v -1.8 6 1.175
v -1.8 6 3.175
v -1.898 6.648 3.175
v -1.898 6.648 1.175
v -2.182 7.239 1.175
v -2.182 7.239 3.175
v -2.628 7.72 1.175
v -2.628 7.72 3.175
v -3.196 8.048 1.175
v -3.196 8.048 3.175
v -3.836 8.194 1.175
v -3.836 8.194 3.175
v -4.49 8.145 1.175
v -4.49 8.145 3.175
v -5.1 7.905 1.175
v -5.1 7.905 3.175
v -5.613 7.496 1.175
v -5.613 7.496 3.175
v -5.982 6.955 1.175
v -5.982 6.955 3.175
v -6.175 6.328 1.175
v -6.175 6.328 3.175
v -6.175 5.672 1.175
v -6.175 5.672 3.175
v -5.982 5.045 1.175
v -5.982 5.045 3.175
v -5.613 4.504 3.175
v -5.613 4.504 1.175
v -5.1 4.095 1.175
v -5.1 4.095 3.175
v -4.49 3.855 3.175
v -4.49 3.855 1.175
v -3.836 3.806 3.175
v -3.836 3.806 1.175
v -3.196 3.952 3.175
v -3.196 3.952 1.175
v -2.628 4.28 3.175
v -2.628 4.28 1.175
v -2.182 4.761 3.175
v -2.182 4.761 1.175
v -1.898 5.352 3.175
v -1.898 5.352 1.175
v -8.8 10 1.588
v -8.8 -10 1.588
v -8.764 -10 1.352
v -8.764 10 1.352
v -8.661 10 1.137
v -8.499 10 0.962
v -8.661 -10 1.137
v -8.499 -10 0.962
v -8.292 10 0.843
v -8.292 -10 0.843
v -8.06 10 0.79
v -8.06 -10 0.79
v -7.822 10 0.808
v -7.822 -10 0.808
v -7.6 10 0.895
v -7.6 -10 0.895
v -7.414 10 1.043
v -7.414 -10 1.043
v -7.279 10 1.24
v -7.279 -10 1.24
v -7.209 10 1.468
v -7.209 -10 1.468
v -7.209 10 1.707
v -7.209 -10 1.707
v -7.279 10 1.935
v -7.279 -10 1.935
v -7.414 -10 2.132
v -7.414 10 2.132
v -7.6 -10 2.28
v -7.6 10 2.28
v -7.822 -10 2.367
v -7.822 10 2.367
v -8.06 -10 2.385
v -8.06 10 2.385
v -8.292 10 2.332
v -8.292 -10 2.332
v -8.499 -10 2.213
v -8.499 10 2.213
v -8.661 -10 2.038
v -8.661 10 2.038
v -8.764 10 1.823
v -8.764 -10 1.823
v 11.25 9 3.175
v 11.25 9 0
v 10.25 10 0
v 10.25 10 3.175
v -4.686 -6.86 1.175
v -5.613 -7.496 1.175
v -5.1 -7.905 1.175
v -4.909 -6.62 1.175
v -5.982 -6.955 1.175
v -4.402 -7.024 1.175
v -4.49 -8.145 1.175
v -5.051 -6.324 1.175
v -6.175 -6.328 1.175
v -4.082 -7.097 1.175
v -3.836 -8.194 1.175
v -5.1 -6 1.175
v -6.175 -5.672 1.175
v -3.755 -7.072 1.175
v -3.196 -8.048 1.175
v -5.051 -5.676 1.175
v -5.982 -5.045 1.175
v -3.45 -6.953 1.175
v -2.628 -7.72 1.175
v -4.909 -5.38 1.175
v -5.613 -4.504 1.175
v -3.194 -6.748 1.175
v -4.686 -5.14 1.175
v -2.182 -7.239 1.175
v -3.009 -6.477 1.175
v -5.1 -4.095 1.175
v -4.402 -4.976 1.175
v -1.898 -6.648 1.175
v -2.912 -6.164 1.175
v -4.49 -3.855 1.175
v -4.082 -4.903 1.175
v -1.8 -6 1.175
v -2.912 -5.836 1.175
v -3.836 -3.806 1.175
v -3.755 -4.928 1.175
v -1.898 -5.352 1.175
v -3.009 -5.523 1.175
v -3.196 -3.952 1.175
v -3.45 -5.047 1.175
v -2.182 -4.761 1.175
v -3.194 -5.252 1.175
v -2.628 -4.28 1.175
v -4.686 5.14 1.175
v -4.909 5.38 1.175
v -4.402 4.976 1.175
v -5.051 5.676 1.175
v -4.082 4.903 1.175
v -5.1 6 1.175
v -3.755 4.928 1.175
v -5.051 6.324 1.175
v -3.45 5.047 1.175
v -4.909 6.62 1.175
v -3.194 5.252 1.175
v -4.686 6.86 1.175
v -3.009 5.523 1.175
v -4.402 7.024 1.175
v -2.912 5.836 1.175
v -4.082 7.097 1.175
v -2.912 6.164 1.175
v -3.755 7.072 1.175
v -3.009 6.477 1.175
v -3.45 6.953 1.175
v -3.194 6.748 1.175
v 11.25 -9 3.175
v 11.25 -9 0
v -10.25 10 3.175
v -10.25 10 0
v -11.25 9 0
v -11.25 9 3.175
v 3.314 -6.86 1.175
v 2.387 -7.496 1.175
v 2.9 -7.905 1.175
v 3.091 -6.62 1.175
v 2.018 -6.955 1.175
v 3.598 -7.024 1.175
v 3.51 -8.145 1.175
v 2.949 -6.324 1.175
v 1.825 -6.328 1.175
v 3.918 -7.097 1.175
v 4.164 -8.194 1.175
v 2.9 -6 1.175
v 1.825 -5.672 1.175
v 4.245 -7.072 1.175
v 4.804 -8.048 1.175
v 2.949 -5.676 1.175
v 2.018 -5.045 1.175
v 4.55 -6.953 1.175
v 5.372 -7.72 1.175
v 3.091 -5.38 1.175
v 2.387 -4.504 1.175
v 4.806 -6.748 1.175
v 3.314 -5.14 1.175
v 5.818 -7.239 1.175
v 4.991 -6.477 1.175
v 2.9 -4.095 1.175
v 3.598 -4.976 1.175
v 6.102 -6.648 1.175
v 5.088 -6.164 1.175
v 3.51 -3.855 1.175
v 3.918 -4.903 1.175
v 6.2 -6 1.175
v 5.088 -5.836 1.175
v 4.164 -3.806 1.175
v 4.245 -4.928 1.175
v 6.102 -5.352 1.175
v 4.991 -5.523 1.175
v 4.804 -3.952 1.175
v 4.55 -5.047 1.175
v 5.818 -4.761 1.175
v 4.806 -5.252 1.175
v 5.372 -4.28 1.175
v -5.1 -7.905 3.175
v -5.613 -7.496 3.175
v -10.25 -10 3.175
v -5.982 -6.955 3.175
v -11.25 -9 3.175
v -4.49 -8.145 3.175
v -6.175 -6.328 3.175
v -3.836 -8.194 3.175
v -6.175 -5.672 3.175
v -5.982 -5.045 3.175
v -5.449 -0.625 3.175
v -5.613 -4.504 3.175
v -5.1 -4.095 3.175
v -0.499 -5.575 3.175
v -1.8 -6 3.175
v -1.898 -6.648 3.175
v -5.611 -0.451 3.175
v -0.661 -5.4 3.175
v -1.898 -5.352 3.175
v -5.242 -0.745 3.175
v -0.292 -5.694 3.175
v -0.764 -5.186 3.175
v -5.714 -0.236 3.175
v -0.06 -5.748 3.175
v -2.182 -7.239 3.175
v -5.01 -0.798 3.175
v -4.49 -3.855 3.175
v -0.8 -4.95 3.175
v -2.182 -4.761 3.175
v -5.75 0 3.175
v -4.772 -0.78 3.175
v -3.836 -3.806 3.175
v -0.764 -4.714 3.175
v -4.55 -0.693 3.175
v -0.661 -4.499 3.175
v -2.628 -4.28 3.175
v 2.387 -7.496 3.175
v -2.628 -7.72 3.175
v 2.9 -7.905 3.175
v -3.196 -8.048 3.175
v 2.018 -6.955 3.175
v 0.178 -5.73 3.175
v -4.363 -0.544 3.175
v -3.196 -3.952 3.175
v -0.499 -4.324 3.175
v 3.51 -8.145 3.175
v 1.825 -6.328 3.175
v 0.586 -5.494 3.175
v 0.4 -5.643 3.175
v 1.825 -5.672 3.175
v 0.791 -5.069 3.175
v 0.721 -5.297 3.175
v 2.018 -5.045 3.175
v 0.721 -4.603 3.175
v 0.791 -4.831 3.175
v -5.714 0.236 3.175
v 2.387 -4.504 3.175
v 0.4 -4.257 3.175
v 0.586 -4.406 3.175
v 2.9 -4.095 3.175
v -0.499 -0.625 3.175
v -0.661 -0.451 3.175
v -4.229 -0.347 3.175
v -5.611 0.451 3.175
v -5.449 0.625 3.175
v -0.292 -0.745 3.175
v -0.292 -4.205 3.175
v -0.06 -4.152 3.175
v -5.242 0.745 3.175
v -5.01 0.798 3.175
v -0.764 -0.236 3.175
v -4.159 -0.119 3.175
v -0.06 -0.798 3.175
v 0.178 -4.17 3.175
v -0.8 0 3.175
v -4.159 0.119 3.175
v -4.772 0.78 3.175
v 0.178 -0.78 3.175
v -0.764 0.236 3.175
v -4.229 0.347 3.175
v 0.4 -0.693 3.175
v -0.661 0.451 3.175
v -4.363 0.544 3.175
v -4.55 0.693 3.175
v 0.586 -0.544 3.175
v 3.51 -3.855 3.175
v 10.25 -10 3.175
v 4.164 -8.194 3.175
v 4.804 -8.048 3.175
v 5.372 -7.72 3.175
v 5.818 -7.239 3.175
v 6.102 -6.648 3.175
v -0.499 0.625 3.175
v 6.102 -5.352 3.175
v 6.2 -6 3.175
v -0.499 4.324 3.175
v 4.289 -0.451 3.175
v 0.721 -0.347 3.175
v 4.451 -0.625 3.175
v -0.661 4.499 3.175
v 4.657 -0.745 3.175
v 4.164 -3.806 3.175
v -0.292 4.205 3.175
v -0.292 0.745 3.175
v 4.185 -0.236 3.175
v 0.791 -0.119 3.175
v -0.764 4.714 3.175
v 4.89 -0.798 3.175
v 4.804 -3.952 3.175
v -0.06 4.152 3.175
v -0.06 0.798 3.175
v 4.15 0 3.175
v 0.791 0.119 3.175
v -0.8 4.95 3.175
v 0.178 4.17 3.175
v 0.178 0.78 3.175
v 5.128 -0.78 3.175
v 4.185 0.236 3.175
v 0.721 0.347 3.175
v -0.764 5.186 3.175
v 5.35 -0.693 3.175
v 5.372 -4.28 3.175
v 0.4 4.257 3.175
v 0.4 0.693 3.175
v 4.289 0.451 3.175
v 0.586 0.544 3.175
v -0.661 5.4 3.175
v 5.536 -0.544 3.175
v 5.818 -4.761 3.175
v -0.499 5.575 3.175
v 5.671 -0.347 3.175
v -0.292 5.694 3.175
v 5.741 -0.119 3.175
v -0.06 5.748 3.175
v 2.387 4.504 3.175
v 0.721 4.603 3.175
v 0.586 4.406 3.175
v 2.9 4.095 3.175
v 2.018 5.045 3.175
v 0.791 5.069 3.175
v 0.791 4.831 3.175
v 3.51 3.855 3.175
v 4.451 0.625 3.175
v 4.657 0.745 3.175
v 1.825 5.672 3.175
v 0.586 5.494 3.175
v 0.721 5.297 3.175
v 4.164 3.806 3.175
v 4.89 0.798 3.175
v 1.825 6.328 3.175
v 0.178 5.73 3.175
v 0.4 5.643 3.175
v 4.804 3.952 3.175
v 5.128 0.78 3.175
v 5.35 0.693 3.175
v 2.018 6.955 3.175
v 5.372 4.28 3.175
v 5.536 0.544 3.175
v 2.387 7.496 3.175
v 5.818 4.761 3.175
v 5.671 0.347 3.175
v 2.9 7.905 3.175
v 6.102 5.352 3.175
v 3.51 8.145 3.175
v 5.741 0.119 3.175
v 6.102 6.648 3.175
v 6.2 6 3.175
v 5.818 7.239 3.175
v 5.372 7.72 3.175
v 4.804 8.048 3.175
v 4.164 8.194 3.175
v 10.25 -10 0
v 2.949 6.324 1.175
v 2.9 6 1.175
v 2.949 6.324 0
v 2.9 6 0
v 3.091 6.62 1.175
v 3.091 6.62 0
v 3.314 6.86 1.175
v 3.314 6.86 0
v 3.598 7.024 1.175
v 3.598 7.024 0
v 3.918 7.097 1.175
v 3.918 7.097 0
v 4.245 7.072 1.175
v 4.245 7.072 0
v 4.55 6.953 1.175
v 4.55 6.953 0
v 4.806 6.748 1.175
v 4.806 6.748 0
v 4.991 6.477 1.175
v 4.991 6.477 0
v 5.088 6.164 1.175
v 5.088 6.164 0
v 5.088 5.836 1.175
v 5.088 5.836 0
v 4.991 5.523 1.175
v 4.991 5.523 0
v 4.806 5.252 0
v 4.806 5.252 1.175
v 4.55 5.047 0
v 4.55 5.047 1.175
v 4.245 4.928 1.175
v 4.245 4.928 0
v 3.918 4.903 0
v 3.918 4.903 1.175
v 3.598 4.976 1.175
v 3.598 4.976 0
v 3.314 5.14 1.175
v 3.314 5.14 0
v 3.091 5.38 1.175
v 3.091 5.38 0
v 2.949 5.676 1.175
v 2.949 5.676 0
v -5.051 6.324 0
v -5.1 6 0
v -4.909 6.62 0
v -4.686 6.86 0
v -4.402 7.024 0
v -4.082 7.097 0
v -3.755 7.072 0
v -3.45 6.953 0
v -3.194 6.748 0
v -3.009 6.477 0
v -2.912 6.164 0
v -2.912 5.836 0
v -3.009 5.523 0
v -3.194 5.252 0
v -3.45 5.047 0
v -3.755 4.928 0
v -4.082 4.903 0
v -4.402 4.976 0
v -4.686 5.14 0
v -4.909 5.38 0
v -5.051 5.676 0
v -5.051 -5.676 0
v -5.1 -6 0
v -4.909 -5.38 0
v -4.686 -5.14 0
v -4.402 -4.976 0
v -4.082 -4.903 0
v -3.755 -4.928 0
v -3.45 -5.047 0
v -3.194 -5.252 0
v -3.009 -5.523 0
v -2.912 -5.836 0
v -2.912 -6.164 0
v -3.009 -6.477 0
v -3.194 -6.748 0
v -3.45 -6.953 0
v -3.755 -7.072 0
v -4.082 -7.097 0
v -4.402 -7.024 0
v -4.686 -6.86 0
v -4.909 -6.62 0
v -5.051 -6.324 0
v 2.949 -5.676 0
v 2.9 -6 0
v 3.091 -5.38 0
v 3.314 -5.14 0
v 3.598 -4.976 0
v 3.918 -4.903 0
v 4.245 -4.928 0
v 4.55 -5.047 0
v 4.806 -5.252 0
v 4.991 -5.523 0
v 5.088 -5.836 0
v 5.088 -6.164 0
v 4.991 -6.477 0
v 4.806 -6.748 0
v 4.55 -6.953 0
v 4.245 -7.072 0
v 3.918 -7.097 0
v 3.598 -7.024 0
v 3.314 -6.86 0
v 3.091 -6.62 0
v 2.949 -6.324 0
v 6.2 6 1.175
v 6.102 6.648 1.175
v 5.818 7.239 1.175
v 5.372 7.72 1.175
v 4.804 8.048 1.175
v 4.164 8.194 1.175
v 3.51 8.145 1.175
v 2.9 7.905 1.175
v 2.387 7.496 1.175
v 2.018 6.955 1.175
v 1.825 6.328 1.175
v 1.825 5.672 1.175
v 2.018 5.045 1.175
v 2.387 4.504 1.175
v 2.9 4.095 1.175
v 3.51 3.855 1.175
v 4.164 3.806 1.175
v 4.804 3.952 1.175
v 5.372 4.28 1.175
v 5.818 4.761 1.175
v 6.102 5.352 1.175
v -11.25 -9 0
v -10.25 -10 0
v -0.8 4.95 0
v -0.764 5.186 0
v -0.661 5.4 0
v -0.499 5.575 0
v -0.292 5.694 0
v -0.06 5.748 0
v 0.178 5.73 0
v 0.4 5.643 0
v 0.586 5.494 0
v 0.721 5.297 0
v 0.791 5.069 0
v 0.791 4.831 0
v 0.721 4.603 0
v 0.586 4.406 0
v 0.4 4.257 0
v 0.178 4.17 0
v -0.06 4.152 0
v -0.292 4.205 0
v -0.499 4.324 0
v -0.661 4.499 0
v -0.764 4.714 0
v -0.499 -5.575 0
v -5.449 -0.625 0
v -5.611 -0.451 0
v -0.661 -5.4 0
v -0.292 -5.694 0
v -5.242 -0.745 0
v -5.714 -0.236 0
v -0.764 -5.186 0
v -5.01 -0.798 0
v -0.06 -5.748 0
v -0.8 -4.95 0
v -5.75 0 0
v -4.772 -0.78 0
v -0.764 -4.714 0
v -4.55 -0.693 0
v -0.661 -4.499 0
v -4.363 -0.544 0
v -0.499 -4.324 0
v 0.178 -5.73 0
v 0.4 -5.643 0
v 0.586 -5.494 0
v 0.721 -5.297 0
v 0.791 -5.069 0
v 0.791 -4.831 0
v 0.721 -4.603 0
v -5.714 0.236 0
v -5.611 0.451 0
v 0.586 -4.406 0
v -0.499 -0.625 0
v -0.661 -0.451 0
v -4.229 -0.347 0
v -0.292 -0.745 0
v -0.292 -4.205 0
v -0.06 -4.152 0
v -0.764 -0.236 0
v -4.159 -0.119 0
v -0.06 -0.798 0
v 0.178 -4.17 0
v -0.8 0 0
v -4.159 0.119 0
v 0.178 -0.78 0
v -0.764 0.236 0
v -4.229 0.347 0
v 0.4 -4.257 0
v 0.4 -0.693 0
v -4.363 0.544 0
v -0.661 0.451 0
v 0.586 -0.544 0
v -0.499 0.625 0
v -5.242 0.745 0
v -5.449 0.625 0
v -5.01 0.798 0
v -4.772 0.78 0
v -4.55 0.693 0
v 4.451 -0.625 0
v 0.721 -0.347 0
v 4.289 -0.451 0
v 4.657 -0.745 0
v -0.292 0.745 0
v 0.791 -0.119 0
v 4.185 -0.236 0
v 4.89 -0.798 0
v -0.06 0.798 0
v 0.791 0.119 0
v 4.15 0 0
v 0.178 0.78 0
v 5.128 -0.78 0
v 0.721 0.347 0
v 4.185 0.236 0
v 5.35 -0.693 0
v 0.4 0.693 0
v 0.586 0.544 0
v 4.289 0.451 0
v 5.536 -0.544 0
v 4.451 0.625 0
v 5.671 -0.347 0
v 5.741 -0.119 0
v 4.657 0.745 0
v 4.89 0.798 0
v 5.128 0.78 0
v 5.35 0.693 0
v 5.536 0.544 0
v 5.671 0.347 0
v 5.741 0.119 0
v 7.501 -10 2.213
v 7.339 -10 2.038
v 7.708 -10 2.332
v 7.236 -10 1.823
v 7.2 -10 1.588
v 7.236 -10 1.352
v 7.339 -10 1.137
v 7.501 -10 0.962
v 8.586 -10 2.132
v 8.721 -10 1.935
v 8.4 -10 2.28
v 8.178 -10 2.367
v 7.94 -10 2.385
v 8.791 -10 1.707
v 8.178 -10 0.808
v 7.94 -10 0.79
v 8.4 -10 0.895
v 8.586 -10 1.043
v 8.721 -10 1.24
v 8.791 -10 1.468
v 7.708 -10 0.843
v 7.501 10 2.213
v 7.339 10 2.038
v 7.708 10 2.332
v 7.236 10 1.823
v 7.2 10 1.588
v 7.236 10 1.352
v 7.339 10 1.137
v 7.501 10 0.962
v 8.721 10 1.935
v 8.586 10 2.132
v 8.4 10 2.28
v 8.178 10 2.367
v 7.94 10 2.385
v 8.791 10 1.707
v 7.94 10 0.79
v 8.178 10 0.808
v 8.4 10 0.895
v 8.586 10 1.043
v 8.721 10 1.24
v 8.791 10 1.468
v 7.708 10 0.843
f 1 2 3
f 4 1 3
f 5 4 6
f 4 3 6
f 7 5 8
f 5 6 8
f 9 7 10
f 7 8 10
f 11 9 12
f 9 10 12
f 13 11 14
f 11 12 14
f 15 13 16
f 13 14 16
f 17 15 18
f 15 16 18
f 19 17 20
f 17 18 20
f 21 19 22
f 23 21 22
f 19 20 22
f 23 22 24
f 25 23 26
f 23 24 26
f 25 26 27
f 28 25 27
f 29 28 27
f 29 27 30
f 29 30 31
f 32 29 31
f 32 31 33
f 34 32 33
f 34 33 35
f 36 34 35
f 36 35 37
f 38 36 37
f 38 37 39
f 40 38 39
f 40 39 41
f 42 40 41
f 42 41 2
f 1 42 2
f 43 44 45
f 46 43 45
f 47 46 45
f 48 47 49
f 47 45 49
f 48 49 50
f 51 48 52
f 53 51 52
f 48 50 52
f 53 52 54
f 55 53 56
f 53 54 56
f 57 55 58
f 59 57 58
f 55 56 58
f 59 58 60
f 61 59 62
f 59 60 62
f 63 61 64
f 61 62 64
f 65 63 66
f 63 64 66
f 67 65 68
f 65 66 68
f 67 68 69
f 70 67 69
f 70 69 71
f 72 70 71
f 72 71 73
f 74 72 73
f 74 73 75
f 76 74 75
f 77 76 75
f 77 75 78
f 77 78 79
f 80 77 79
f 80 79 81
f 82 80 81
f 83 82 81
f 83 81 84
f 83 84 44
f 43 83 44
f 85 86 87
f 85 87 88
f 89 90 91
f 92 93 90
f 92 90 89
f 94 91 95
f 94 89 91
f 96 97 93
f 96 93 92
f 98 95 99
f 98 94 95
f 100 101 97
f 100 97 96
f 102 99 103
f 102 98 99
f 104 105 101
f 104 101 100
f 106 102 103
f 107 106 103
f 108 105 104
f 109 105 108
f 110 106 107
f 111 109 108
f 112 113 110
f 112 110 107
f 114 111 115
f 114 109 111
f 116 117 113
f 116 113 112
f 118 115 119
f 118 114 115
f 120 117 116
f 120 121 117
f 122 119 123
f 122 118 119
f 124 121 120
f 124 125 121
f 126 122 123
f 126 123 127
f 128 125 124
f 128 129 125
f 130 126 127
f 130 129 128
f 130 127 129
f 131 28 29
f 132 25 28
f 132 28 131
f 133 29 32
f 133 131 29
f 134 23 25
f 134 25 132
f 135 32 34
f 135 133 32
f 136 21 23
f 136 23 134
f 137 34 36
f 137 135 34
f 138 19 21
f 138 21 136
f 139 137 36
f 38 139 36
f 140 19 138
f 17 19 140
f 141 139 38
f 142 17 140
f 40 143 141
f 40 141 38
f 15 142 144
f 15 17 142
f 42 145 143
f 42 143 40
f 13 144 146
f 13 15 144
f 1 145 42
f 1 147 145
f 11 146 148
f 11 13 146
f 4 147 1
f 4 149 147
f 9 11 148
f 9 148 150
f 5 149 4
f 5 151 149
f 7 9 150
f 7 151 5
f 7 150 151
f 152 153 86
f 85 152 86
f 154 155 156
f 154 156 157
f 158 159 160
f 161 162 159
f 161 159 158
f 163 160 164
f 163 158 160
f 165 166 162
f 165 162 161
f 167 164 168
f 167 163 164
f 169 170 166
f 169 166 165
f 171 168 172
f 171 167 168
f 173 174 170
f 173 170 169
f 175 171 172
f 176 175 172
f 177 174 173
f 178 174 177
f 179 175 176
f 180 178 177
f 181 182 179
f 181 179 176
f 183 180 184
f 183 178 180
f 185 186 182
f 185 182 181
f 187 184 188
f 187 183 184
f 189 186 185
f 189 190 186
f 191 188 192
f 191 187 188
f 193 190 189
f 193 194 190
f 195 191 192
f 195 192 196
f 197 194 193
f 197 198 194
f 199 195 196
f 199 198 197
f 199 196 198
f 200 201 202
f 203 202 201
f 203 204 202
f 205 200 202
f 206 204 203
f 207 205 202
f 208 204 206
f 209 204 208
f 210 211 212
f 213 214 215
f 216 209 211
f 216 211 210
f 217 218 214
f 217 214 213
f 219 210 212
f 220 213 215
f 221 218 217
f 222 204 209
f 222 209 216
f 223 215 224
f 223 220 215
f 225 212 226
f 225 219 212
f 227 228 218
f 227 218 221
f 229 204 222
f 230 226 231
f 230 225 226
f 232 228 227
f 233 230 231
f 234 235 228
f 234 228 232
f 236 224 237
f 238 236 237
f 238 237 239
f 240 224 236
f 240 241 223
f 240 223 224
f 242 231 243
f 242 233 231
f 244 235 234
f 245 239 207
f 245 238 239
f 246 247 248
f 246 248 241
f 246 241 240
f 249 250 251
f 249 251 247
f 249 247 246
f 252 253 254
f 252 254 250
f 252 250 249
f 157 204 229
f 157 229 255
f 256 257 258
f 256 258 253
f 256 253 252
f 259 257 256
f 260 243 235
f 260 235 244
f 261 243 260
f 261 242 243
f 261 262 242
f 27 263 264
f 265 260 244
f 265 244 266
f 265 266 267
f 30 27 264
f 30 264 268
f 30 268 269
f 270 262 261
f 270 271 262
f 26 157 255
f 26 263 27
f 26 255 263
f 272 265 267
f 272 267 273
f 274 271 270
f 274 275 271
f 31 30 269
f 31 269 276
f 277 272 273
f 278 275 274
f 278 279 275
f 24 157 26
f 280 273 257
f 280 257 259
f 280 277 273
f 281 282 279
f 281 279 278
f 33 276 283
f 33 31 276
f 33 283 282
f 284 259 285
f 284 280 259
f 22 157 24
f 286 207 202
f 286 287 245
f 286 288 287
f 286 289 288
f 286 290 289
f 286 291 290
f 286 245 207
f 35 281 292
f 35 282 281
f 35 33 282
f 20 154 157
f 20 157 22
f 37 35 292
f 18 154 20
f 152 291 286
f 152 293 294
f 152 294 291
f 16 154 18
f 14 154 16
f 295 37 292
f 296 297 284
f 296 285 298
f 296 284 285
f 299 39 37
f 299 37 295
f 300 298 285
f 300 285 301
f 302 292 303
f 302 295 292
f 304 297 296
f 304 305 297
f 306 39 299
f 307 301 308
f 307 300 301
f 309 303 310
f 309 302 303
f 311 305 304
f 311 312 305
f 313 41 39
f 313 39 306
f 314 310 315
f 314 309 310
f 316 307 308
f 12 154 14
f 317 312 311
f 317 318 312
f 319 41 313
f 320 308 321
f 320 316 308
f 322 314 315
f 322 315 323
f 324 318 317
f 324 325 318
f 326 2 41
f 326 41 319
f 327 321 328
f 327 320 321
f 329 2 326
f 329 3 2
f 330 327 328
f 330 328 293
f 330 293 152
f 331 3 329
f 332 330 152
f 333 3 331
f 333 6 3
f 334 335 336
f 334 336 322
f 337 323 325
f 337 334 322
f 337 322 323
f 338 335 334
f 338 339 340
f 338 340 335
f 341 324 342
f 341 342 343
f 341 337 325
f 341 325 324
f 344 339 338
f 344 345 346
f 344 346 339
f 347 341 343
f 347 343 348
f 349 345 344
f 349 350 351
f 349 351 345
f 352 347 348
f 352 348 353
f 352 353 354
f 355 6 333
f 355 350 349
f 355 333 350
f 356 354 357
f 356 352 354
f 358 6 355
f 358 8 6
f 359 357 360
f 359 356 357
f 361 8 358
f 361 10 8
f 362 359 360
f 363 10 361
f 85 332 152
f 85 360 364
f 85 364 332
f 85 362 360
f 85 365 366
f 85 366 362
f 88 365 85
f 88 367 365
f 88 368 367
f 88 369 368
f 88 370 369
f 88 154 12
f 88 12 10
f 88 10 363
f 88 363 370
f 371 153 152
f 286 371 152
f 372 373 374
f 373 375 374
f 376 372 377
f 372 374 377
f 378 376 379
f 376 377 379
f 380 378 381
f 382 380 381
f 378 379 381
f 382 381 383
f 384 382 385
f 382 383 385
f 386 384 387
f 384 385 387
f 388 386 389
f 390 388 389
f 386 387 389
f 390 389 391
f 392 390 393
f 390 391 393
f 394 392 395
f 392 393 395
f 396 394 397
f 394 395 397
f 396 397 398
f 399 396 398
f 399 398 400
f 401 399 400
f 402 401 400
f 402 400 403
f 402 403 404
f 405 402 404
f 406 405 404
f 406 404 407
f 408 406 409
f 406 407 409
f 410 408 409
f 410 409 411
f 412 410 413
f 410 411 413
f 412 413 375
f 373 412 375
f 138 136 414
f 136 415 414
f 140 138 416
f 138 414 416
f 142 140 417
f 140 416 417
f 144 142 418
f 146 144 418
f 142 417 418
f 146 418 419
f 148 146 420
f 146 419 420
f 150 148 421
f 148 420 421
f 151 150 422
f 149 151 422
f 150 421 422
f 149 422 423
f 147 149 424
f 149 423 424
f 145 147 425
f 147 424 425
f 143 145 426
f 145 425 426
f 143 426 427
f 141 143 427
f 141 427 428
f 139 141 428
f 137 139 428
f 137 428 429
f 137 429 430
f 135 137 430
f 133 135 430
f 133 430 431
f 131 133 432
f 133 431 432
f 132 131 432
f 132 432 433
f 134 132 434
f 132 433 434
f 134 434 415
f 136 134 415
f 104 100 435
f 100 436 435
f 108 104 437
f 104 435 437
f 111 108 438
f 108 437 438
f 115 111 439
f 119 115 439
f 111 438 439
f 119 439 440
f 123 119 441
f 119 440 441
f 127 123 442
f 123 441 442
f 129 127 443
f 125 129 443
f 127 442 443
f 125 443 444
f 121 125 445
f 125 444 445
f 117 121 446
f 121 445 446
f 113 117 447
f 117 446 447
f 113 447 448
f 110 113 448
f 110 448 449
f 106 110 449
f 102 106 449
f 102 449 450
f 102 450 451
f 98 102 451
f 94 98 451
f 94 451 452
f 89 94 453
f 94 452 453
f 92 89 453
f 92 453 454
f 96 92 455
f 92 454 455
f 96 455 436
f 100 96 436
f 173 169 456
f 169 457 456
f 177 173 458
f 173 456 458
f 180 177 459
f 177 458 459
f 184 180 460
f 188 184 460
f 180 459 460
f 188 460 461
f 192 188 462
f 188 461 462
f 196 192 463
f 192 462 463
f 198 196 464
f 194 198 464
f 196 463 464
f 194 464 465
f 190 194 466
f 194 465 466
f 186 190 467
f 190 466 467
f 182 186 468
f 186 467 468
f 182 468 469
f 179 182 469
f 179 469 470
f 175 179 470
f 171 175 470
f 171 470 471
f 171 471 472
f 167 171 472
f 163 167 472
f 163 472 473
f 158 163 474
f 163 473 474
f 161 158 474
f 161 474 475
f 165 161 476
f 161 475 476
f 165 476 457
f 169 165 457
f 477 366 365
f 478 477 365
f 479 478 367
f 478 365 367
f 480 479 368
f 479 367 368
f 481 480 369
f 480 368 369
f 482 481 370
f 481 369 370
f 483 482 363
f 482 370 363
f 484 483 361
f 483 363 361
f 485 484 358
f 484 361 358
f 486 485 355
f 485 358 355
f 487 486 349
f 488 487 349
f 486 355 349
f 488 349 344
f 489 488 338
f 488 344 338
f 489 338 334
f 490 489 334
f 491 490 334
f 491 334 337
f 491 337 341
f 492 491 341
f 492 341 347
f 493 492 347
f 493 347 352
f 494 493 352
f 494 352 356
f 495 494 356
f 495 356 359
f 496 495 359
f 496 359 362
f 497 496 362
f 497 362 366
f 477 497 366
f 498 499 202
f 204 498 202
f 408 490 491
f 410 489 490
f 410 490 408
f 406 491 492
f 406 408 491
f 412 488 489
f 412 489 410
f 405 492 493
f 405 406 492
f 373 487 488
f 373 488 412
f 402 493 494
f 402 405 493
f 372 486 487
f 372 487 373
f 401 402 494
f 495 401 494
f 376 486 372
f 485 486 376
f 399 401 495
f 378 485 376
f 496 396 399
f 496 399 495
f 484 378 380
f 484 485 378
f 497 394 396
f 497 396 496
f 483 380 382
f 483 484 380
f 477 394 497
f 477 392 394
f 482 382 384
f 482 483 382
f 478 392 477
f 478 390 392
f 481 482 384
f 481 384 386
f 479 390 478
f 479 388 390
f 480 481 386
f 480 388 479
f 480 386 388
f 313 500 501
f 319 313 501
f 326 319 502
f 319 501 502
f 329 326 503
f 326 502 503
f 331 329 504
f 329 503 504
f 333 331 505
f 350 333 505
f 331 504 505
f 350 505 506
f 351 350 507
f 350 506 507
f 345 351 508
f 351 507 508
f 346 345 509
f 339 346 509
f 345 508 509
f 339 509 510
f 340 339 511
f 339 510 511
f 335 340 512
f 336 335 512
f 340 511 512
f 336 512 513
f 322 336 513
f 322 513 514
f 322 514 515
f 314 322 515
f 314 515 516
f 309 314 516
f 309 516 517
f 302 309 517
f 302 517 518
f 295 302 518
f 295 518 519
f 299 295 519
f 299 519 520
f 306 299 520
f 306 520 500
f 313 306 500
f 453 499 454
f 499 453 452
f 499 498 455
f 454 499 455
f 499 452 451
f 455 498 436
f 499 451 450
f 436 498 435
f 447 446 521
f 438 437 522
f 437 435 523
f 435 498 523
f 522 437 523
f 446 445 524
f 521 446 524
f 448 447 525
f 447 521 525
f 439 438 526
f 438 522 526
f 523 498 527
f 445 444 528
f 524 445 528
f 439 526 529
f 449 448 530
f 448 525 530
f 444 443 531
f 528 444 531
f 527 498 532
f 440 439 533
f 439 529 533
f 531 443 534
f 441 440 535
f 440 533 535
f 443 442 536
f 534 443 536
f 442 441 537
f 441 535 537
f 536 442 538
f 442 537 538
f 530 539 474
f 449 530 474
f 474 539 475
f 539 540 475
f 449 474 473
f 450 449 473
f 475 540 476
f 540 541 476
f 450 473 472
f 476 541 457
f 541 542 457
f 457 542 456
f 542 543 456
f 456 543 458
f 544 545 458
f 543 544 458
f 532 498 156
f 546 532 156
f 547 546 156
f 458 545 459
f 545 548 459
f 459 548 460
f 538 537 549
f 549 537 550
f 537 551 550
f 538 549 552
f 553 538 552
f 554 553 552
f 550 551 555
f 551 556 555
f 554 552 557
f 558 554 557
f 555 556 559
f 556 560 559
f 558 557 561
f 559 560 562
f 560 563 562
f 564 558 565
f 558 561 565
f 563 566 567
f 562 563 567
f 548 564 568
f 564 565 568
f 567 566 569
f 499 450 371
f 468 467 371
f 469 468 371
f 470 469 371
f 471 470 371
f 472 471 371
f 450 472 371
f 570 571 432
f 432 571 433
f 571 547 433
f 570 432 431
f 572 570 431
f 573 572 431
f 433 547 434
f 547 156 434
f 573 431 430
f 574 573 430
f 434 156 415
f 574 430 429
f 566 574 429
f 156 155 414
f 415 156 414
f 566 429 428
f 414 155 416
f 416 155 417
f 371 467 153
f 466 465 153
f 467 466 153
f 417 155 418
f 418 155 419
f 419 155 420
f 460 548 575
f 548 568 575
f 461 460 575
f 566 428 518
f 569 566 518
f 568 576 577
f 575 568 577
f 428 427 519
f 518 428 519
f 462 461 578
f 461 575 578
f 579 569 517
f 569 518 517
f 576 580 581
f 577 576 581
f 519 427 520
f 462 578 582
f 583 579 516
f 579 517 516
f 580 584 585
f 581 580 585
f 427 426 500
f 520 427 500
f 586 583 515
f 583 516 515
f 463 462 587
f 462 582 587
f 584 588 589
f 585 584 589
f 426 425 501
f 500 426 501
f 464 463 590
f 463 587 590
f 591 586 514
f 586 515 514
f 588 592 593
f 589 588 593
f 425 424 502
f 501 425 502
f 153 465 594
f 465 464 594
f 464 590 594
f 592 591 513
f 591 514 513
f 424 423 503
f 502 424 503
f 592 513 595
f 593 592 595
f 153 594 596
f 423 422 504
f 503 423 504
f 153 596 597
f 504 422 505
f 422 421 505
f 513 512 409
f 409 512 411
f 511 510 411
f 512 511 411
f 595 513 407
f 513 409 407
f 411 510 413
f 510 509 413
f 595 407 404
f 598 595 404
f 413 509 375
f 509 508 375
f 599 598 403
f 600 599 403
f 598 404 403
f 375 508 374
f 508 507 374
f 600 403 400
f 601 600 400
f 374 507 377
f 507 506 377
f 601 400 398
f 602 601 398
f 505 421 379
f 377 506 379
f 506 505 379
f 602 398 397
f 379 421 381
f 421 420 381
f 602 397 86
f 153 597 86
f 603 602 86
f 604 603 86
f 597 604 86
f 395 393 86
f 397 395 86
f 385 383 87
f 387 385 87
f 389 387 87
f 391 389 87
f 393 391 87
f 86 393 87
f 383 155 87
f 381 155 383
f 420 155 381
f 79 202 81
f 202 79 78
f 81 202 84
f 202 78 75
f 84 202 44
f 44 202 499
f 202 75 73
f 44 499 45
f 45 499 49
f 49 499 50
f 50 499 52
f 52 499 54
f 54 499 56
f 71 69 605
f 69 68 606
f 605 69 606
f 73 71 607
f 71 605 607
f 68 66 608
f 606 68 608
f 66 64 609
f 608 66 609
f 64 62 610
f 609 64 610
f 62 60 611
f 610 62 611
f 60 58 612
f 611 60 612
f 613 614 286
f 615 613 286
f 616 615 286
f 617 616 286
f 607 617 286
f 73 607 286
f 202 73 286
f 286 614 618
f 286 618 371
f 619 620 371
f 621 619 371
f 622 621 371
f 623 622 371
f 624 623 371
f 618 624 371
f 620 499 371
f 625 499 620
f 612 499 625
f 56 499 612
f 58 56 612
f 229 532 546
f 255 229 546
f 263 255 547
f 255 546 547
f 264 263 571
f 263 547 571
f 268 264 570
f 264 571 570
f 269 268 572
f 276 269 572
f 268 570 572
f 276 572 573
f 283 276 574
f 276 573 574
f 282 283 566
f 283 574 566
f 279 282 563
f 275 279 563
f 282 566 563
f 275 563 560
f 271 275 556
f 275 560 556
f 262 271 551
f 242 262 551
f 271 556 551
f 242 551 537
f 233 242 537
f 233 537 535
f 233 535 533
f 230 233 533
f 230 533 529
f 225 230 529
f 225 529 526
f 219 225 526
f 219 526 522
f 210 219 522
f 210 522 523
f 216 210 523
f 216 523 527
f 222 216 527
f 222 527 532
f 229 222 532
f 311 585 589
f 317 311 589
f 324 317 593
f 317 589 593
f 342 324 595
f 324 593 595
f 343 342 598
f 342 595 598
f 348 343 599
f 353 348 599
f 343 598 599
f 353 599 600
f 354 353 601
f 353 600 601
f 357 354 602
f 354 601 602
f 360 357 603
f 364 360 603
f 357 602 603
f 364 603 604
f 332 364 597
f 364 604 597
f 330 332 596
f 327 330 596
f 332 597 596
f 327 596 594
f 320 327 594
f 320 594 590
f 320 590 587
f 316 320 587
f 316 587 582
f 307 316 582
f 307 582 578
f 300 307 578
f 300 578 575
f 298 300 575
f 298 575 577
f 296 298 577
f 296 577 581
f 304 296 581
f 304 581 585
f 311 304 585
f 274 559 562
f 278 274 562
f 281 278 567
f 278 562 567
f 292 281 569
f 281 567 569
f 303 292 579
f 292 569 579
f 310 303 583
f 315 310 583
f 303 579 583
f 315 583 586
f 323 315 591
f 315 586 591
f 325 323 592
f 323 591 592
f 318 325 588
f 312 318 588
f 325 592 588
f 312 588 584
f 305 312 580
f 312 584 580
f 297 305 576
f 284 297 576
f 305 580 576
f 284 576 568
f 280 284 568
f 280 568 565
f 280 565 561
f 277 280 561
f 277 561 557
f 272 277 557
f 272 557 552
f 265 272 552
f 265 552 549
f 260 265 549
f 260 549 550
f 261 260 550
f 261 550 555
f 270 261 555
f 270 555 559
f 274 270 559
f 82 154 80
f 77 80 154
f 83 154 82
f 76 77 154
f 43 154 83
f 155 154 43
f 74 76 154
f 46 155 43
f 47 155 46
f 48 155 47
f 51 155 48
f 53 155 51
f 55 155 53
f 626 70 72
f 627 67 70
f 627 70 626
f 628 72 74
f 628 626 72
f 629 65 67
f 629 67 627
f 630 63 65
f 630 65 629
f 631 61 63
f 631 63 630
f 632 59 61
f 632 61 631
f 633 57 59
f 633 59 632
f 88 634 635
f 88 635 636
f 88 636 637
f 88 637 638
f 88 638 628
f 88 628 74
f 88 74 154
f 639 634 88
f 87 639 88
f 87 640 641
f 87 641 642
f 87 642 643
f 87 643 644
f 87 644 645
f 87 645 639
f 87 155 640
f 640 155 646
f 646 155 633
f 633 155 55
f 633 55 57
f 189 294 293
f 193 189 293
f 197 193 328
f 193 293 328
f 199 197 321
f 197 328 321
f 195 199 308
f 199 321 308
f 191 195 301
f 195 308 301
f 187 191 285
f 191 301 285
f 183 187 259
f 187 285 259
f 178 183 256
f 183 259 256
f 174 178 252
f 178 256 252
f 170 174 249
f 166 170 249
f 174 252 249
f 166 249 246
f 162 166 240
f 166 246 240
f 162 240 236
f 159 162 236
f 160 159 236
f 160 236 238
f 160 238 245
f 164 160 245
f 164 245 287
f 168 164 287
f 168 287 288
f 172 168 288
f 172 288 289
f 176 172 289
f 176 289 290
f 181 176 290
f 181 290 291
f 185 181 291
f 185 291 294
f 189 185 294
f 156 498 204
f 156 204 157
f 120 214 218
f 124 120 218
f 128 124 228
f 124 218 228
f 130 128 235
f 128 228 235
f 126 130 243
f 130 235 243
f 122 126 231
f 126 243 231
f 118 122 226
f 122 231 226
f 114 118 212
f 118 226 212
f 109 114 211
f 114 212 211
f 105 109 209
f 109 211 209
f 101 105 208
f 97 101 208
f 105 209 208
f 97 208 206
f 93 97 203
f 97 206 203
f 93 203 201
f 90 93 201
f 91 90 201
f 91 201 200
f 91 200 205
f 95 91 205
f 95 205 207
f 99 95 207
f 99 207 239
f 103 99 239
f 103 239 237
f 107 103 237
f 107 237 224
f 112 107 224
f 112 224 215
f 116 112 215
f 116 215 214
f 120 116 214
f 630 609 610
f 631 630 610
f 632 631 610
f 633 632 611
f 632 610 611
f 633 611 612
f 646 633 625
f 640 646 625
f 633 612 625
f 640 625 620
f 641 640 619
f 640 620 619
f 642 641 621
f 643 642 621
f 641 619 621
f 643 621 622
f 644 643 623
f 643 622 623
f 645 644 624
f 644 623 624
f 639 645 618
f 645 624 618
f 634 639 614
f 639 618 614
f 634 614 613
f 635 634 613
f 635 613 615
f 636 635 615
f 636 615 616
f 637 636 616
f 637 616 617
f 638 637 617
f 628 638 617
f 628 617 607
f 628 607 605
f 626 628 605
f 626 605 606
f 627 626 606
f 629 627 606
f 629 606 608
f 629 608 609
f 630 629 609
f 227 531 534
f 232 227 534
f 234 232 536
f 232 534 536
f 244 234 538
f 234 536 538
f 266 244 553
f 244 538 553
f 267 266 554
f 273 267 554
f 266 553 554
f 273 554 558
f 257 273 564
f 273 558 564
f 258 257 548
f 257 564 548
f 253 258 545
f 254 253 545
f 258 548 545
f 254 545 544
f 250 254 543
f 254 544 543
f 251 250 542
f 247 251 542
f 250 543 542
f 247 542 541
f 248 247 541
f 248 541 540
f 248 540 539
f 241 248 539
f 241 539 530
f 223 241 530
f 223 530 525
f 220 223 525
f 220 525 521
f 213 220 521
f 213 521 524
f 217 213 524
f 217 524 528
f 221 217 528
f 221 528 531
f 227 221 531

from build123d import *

# Parameters (mm, degrees)
SKETCH1_W                      = 22.5
SKETCH1_H                      = 20
BOSS_EXTRUDE1_DEPTH            = 3.175
CBORE_FOR_M2_SHCS1_D           = 2.2
CBORE_FOR_M2_SHCS1_CBORE_D     = 4.4
CBORE_FOR_M2_SHCS1_CBORE_DEPTH = 2
TAP_DRILL_FOR_M2X0_4_TAP1_D    = 1.6
TAP_DRILL_FOR_M2X0_4_TAP2_D    = 1.6
FILLET1_SIZE                   = 1


with BuildPart() as part:
    # Sketch1 → Boss-Extrude1 (new body)
    with BuildSketch(Plane.XY):
        Rectangle(SKETCH1_W, SKETCH1_H)
    extrude(amount=BOSS_EXTRUDE1_DEPTH)

    # CBORE for M2 SHCS1 (through all)
    with Locations(Plane.XY.offset(3.175)):
        with Locations((4, 6), (-4, -6), (-4, 6), (4, -6)):
            CounterBoreHole(CBORE_FOR_M2_SHCS1_D / 2, CBORE_FOR_M2_SHCS1_CBORE_D / 2, CBORE_FOR_M2_SHCS1_CBORE_DEPTH)

    # Tap Drill for M2x0.4 Tap1 (through all)
    with Locations(Plane(origin=(0, 10, 0), x_dir=(1, 0, 0), z_dir=(0, 1, 0))):
        with Locations((8, -1.5875), (-8, -1.5875)):
            Hole(TAP_DRILL_FOR_M2X0_4_TAP1_D / 2)

    # Tap Drill for M2x0.4 Tap2 (through all)
    with Locations(Plane.XY.offset(3.175)):
        with Locations((0, 0), (-4.949747468, 0), (0, -4.949747468), (4.949747468, 0), (0, 4.949747468)):
            Hole(TAP_DRILL_FOR_M2X0_4_TAP2_D / 2)

    # Fillet1
    fillet1_edges = [part.edges().sort_by_distance(p)[0] for p in [
        (11.25, -10, 1.5875),
        (-11.25, -10, 1.5875),
        (-11.25, 10, 1.5875),
        (11.25, 10, 1.5875),
    ]]
    chamfer(fillet1_edges, length=FILLET1_SIZE)


solid = part.part
